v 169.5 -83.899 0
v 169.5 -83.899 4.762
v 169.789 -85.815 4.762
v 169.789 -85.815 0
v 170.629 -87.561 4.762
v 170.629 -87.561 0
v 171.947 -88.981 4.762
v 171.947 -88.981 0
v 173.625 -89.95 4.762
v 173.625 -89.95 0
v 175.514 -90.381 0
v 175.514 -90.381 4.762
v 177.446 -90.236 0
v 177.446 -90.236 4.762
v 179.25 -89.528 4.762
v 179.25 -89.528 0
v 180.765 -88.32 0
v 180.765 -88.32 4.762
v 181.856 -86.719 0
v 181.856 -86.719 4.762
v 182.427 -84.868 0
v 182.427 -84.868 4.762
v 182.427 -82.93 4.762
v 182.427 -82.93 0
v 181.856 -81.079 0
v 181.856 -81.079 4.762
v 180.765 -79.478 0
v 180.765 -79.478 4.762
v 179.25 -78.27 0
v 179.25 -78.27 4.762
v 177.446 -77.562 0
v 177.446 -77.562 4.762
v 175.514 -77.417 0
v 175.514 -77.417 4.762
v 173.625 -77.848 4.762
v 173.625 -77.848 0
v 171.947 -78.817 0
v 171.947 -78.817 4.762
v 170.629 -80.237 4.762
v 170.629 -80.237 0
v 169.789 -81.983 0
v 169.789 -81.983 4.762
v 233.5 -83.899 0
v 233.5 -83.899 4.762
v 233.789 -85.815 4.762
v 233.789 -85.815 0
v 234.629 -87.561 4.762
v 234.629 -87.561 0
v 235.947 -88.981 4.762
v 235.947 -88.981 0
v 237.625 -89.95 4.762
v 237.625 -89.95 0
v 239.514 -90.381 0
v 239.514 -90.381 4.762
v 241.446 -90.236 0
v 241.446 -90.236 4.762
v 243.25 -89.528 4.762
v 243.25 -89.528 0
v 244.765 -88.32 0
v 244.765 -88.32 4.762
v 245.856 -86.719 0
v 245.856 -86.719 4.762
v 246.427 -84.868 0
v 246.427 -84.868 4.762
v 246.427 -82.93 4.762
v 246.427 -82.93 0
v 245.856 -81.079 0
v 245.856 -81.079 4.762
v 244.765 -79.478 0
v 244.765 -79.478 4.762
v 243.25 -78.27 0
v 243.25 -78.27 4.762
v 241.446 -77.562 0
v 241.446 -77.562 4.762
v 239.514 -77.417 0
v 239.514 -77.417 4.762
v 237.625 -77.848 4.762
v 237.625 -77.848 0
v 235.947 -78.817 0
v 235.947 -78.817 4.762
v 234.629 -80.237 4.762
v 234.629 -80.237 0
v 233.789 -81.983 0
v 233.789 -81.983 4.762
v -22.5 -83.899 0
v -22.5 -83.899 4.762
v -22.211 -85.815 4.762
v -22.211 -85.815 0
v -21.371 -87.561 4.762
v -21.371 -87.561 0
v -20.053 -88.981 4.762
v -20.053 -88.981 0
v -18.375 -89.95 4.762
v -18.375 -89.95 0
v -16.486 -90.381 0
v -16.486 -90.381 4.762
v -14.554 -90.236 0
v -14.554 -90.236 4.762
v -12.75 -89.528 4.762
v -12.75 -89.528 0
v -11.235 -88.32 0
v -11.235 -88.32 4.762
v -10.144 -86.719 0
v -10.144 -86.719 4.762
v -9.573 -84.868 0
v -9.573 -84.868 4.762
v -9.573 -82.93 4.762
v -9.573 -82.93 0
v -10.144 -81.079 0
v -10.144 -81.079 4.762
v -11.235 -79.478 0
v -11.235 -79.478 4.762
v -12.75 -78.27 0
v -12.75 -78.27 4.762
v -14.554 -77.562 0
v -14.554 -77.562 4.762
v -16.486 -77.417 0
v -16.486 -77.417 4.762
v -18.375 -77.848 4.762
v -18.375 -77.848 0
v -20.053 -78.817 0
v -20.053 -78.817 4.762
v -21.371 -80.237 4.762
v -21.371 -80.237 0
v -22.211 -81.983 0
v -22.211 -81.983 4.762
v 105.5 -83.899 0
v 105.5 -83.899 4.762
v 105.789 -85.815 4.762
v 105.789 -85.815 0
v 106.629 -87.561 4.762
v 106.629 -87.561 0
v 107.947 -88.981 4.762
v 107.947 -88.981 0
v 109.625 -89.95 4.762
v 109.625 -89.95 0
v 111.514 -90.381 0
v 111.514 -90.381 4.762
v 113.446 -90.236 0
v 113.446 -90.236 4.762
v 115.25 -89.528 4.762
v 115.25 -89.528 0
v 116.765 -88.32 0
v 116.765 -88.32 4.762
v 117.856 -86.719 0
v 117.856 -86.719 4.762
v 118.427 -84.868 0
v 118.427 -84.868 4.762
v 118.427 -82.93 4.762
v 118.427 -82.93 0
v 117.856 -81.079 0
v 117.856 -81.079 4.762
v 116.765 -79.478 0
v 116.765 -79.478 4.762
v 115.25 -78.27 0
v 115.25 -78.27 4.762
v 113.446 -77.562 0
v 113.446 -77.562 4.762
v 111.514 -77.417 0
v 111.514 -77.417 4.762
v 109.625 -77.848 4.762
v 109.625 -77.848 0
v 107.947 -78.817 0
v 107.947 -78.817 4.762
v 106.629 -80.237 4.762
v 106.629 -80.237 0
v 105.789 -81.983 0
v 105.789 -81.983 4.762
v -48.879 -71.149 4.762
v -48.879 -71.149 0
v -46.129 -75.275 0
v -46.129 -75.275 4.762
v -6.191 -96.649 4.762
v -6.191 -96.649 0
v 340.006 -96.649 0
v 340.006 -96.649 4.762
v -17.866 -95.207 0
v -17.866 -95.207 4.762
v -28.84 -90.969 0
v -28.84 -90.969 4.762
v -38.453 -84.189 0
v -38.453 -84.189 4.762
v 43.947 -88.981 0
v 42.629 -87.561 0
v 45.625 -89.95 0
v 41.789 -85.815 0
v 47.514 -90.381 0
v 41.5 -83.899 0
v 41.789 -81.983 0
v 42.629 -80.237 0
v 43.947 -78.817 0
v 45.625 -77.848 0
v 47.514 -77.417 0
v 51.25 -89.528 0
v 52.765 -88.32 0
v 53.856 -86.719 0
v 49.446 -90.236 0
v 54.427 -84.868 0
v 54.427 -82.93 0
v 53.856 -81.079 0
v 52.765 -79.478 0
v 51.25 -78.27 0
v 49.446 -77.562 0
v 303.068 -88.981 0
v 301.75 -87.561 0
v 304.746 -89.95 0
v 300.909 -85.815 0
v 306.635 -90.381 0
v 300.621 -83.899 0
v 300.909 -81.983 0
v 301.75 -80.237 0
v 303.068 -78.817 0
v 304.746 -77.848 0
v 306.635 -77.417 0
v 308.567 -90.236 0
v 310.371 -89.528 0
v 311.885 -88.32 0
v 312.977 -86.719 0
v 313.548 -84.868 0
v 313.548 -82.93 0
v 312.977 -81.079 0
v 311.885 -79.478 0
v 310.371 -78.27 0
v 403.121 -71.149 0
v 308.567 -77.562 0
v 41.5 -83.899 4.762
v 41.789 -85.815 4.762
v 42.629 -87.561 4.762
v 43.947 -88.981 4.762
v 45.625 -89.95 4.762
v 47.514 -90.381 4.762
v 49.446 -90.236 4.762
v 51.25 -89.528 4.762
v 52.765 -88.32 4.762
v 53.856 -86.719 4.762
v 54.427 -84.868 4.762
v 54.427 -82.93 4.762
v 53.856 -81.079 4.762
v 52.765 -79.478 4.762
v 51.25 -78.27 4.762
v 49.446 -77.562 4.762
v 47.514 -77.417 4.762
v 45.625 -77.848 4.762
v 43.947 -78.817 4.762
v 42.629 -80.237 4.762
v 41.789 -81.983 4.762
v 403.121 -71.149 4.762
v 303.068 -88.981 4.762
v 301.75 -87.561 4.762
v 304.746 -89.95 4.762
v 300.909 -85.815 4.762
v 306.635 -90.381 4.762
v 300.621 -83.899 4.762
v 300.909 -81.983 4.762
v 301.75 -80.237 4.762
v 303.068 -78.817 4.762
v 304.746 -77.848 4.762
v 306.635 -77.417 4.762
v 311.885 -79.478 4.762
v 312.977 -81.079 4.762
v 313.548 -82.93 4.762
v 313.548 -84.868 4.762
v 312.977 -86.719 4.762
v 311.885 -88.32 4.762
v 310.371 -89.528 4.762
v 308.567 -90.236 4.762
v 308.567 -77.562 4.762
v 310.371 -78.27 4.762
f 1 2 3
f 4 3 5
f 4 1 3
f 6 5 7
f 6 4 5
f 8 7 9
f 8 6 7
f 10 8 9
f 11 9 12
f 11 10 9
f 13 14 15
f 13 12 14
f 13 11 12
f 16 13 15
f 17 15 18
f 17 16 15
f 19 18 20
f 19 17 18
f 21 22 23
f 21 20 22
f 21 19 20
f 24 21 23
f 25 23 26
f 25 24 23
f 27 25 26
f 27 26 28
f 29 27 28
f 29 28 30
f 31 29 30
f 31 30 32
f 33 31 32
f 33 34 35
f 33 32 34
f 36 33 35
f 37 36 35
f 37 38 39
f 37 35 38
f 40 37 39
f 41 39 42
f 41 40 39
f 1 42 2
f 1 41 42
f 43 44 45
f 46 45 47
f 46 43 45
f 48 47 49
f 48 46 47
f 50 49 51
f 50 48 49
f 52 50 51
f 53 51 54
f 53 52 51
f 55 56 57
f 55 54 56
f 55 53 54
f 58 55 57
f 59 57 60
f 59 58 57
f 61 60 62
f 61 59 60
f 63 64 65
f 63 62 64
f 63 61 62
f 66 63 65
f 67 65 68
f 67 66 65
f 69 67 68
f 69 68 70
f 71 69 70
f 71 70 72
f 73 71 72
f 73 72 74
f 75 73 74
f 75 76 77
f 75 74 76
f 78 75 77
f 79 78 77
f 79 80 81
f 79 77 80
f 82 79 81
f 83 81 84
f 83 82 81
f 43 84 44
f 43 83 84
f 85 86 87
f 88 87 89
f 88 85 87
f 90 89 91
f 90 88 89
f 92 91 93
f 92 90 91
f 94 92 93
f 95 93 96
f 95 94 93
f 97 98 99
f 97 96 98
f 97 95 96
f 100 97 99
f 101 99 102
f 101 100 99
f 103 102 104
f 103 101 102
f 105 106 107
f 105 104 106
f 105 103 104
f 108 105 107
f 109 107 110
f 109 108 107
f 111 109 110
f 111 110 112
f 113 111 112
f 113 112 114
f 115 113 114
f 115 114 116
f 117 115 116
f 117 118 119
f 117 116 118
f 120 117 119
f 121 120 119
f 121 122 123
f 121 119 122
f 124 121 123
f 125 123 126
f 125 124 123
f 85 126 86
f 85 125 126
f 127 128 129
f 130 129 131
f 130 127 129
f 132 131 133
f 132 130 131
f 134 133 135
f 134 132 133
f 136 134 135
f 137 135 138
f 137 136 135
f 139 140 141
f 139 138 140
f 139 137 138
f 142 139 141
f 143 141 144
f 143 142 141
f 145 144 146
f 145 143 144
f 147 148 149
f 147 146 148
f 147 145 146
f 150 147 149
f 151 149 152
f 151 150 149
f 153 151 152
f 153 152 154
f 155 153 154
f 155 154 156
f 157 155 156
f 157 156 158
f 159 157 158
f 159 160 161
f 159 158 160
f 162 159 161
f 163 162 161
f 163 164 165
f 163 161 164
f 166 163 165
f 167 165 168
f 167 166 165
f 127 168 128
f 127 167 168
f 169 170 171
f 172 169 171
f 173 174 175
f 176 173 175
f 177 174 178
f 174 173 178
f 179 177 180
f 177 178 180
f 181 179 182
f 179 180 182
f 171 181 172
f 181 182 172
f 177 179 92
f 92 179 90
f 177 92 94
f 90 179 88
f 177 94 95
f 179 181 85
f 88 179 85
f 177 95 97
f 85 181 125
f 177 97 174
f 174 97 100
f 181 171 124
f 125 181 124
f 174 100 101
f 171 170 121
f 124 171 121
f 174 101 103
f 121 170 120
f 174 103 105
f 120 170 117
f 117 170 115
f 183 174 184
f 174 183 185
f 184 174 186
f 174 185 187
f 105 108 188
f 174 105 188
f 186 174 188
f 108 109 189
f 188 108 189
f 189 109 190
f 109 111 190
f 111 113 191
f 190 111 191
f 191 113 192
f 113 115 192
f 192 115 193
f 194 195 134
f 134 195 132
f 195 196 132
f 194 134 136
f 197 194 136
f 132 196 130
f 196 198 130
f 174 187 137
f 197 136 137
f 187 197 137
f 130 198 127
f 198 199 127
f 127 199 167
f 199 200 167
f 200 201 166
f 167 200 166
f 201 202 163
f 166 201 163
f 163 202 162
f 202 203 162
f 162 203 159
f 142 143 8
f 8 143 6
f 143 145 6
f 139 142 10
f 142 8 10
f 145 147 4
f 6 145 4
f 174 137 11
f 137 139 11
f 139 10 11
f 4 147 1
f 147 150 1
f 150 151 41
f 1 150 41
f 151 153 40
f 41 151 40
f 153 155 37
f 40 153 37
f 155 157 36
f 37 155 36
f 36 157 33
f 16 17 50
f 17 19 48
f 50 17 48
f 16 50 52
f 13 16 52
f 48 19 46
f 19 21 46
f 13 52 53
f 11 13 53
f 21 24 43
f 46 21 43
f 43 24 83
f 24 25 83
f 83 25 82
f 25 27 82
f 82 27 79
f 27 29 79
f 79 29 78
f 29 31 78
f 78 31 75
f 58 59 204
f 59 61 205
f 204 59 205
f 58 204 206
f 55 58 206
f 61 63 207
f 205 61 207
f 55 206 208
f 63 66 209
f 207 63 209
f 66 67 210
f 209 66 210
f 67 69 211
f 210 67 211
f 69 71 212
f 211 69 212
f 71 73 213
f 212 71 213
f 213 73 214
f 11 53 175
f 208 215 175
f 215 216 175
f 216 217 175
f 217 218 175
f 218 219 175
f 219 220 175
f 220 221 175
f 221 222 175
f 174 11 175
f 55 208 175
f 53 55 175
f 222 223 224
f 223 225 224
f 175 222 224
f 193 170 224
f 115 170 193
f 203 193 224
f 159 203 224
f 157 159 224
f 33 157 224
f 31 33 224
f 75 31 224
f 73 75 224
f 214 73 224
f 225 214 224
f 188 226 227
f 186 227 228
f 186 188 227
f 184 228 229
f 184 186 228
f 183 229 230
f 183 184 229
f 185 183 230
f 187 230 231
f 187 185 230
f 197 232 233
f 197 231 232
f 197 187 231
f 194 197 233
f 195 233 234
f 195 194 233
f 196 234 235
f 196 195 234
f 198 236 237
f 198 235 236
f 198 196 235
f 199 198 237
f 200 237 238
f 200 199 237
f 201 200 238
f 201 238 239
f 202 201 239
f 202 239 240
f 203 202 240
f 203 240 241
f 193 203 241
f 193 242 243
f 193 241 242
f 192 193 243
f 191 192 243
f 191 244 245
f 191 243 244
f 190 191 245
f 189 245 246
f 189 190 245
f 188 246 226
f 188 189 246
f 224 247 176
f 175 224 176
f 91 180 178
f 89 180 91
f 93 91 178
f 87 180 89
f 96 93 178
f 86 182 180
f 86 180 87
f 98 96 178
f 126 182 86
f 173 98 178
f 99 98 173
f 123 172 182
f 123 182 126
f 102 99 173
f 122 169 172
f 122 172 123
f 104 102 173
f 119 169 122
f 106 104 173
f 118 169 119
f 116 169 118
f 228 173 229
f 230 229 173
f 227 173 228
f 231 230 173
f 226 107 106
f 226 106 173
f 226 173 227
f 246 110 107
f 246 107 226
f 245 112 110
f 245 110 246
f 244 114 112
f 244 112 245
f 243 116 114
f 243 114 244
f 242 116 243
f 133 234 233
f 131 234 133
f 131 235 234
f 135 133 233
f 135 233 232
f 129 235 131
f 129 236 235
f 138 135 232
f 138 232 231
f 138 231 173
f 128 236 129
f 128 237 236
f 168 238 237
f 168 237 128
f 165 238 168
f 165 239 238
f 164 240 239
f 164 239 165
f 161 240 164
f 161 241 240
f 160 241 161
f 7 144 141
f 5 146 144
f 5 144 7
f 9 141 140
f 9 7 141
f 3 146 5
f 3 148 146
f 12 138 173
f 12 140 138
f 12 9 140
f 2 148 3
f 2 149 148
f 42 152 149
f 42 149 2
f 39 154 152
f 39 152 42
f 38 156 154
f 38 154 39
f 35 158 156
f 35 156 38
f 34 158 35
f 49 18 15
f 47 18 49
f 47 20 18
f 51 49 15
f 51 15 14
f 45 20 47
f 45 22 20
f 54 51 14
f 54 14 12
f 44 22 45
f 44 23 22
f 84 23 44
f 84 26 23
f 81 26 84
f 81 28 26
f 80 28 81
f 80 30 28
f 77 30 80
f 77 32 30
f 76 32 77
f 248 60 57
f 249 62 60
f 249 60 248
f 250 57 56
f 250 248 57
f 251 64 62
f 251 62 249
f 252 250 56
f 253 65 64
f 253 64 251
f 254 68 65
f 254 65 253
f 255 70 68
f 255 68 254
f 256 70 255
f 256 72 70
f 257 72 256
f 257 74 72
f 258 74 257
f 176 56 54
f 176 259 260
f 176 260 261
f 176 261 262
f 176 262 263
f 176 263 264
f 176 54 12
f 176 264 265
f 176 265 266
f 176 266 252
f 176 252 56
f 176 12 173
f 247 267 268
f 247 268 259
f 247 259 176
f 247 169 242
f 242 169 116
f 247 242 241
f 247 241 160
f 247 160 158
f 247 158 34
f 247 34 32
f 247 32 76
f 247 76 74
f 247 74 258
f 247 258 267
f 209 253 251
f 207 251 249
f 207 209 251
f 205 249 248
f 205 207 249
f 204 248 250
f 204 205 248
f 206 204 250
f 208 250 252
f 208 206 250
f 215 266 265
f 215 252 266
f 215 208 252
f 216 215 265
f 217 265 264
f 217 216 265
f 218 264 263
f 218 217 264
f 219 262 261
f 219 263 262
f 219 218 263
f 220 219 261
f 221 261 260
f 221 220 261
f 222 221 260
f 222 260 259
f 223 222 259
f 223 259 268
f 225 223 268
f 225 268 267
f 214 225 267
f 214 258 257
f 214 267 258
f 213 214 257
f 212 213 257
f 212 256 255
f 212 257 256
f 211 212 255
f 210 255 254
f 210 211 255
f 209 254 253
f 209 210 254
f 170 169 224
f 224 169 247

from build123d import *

# Parameters (mm, degrees)
BOSS_EXTRUDE1_DEPTH = 4.7625
SKETCH1_4_R         = 6.5
CUT_EXTRUDE1_DEPTH  = 439.920211962
CUT_EXTRUDE5_DEPTH  = 10
FILLET1_R           = 48
CUT_EXTRUDE6_DEPTH  = 10


with BuildPart() as part:
    # Sketch1 → Boss-Extrude1 (new body)
    with BuildSketch(Plane.XY):
        Polygon((428.120588235, 28.570833333), (0, 28.570833333), (-98.879411765, 3.850980392), (-31.879411765, -96.649019608), (366, -96.649019608), (403.120588235, -71.149019608), align=None)
    extrude(amount=BOSS_EXTRUDE1_DEPTH)

    # Sketch1<4> → Cut-Extrude1 (cut, through all)
    with BuildSketch(Plane.XY):
        with Locations((-16, -83.899019608)):
            Circle(SKETCH1_4_R)
        with Locations((48, -83.899019608)):
            Circle(SKETCH1_4_R)
        with Locations((112, -83.899019608)):
            Circle(SKETCH1_4_R)
        with Locations((176, -83.899019608)):
            Circle(SKETCH1_4_R)
        with Locations((240, -83.899019608)):
            Circle(SKETCH1_4_R)
        with Locations((307.120588235, -83.899019608)):
            Circle(SKETCH1_4_R)
    extrude(amount=CUT_EXTRUDE1_DEPTH, mode=Mode.SUBTRACT)

    # Sketch8 → Cut-Extrude5 (cut)
    with BuildSketch(Plane.XY.offset(4.7625)):
        Polygon((-48.879411765, -71.149019608), (403.120588235, -71.149019608), (428.120588235, 28.570833333), (0, 28.570833333), (-98.879411765, 3.850980392), align=None)
    extrude(amount=-CUT_EXTRUDE5_DEPTH, mode=Mode.SUBTRACT)

    # Fillet1
    fillet1_edges = [part.edges().sort_by_distance(p)[0] for p in [
        (-31.879411765, -96.649019608, 2.38125),
    ]]
    fillet(fillet1_edges, radius=FILLET1_R)

    # Sketch9 → Cut-Extrude6 (cut)
    with BuildSketch(Plane.XY.offset(4.7625)):
        Polygon((403.120588235, -71.149019608), (340.005873473, -96.649019608), (366, -96.649019608), align=None)
    extrude(amount=-CUT_EXTRUDE6_DEPTH, mode=Mode.SUBTRACT)


solid = part.part
